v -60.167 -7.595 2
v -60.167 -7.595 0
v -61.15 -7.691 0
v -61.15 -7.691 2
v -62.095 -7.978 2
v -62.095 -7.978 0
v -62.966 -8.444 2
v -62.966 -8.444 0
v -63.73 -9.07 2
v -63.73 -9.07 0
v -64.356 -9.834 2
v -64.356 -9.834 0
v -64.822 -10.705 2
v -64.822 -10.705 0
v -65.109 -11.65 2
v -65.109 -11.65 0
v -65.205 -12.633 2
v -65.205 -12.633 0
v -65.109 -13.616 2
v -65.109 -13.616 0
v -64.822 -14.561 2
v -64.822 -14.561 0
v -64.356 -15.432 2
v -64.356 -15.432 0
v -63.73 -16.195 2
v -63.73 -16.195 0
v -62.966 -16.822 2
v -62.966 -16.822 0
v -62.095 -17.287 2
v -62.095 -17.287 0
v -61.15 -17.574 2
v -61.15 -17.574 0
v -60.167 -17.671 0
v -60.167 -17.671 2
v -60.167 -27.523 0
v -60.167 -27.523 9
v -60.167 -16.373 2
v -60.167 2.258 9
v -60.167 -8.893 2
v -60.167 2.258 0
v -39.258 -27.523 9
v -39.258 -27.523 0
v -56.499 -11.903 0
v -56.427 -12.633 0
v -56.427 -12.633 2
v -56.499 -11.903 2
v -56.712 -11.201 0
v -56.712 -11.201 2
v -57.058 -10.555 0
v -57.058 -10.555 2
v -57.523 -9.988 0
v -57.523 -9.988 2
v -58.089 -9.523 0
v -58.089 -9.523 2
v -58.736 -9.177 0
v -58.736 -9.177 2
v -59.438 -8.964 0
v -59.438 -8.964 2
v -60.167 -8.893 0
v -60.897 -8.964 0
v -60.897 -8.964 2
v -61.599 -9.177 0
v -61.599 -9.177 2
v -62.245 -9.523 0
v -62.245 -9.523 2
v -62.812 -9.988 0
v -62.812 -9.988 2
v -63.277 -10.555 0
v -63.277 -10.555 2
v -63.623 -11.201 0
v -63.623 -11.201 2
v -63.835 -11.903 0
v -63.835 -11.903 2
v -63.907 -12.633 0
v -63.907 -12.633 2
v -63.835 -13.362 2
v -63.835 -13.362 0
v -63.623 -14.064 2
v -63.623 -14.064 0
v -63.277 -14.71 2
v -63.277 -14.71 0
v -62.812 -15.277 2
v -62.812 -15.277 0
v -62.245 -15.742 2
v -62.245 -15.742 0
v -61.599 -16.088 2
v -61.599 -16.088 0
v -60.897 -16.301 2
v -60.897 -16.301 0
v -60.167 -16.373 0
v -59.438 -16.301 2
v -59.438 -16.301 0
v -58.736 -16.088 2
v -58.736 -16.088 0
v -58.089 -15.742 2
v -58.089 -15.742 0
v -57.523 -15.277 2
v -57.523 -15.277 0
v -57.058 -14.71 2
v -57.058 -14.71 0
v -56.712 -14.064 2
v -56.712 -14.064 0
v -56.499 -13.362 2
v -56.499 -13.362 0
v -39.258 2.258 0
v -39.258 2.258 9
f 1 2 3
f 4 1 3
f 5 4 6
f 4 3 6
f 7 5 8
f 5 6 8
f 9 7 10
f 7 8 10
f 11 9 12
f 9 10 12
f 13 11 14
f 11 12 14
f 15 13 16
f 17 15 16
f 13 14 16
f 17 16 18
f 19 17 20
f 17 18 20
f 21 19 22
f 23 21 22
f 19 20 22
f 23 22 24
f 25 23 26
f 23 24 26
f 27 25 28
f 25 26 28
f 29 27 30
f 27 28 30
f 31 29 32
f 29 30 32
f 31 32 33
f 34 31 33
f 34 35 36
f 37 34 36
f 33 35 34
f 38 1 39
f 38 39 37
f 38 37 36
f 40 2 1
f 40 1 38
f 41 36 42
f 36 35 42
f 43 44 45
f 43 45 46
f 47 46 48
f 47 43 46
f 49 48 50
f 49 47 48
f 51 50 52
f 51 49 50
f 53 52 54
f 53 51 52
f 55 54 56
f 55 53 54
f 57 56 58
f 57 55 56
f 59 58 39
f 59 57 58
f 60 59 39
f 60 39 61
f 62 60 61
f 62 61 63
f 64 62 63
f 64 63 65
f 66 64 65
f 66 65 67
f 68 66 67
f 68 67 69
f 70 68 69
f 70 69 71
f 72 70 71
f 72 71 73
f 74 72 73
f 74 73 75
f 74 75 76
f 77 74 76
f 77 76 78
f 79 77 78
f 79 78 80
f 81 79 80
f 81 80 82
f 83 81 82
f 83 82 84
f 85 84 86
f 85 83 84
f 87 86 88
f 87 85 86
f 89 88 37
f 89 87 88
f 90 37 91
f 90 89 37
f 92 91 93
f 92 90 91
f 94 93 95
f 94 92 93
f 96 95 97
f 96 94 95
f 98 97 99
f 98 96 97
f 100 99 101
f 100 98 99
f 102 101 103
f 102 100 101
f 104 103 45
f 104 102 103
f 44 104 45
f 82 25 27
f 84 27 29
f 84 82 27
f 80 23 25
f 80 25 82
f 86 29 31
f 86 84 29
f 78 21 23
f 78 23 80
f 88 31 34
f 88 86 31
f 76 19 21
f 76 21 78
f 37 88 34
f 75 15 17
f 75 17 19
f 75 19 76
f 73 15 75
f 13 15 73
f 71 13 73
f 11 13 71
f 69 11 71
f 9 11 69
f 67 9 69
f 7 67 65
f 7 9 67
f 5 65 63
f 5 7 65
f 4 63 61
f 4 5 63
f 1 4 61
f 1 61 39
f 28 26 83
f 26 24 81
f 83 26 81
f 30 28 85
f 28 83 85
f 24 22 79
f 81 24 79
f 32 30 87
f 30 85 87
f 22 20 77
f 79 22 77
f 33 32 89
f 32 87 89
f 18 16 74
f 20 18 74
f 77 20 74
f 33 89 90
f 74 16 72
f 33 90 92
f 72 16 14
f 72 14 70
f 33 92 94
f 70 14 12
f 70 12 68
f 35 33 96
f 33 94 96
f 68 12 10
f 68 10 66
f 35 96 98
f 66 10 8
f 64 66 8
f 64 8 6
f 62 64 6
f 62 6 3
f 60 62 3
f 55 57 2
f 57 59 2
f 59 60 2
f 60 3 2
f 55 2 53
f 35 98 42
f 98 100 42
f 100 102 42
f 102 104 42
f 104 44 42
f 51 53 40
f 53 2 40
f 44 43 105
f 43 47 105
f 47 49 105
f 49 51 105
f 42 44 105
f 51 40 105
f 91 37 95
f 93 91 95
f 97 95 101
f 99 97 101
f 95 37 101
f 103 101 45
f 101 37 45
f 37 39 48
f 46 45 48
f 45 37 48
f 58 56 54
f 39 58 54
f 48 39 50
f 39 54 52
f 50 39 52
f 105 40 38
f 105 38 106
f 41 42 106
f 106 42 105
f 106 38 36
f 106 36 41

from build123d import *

# Parameters (mm, degrees)
SKETCH3_R           = 3.739985504
BOSS_EXTRUDE1_DEPTH = 2
SKETCH4_W           = 20.9095389
SKETCH4_H           = 29.780418306
BOSS_EXTRUDE2_DEPTH = 7


with BuildPart() as part:
    # Sketch3 → Boss-Extrude1 (new body)
    with BuildSketch(Plane.XY):
        with BuildLine():
            Line((-60.167323843, -17.670722848), (-60.167323843, -27.522824769))
            Line((-60.167323843, -27.522824769), (-39.257784943, -27.522824769))
            Line((-39.257784943, -27.522824769), (-39.257784943, 2.257593537))
            Line((-39.257784943, 2.257593537), (-60.167323843, 2.257593537))
            Line((-60.167323843, 2.257593537), (-60.167323843, -7.594508384))
            ThreePointArc((-60.167323843, -7.594508384), (-65.205431076, -12.632615616), (-60.167323843, -17.670722848))
        make_face()
        with Locations((-60.167323843, -12.632615616)):
            Circle(SKETCH3_R, mode=Mode.SUBTRACT)
    extrude(amount=BOSS_EXTRUDE1_DEPTH)

    # Sketch4 → Boss-Extrude2 (add)
    with BuildSketch(Plane.XY.offset(2)):
        with Locations((-49.712554393, -12.632615616)):
            Rectangle(SKETCH4_W, SKETCH4_H)
    extrude(amount=BOSS_EXTRUDE2_DEPTH)


solid = part.part
